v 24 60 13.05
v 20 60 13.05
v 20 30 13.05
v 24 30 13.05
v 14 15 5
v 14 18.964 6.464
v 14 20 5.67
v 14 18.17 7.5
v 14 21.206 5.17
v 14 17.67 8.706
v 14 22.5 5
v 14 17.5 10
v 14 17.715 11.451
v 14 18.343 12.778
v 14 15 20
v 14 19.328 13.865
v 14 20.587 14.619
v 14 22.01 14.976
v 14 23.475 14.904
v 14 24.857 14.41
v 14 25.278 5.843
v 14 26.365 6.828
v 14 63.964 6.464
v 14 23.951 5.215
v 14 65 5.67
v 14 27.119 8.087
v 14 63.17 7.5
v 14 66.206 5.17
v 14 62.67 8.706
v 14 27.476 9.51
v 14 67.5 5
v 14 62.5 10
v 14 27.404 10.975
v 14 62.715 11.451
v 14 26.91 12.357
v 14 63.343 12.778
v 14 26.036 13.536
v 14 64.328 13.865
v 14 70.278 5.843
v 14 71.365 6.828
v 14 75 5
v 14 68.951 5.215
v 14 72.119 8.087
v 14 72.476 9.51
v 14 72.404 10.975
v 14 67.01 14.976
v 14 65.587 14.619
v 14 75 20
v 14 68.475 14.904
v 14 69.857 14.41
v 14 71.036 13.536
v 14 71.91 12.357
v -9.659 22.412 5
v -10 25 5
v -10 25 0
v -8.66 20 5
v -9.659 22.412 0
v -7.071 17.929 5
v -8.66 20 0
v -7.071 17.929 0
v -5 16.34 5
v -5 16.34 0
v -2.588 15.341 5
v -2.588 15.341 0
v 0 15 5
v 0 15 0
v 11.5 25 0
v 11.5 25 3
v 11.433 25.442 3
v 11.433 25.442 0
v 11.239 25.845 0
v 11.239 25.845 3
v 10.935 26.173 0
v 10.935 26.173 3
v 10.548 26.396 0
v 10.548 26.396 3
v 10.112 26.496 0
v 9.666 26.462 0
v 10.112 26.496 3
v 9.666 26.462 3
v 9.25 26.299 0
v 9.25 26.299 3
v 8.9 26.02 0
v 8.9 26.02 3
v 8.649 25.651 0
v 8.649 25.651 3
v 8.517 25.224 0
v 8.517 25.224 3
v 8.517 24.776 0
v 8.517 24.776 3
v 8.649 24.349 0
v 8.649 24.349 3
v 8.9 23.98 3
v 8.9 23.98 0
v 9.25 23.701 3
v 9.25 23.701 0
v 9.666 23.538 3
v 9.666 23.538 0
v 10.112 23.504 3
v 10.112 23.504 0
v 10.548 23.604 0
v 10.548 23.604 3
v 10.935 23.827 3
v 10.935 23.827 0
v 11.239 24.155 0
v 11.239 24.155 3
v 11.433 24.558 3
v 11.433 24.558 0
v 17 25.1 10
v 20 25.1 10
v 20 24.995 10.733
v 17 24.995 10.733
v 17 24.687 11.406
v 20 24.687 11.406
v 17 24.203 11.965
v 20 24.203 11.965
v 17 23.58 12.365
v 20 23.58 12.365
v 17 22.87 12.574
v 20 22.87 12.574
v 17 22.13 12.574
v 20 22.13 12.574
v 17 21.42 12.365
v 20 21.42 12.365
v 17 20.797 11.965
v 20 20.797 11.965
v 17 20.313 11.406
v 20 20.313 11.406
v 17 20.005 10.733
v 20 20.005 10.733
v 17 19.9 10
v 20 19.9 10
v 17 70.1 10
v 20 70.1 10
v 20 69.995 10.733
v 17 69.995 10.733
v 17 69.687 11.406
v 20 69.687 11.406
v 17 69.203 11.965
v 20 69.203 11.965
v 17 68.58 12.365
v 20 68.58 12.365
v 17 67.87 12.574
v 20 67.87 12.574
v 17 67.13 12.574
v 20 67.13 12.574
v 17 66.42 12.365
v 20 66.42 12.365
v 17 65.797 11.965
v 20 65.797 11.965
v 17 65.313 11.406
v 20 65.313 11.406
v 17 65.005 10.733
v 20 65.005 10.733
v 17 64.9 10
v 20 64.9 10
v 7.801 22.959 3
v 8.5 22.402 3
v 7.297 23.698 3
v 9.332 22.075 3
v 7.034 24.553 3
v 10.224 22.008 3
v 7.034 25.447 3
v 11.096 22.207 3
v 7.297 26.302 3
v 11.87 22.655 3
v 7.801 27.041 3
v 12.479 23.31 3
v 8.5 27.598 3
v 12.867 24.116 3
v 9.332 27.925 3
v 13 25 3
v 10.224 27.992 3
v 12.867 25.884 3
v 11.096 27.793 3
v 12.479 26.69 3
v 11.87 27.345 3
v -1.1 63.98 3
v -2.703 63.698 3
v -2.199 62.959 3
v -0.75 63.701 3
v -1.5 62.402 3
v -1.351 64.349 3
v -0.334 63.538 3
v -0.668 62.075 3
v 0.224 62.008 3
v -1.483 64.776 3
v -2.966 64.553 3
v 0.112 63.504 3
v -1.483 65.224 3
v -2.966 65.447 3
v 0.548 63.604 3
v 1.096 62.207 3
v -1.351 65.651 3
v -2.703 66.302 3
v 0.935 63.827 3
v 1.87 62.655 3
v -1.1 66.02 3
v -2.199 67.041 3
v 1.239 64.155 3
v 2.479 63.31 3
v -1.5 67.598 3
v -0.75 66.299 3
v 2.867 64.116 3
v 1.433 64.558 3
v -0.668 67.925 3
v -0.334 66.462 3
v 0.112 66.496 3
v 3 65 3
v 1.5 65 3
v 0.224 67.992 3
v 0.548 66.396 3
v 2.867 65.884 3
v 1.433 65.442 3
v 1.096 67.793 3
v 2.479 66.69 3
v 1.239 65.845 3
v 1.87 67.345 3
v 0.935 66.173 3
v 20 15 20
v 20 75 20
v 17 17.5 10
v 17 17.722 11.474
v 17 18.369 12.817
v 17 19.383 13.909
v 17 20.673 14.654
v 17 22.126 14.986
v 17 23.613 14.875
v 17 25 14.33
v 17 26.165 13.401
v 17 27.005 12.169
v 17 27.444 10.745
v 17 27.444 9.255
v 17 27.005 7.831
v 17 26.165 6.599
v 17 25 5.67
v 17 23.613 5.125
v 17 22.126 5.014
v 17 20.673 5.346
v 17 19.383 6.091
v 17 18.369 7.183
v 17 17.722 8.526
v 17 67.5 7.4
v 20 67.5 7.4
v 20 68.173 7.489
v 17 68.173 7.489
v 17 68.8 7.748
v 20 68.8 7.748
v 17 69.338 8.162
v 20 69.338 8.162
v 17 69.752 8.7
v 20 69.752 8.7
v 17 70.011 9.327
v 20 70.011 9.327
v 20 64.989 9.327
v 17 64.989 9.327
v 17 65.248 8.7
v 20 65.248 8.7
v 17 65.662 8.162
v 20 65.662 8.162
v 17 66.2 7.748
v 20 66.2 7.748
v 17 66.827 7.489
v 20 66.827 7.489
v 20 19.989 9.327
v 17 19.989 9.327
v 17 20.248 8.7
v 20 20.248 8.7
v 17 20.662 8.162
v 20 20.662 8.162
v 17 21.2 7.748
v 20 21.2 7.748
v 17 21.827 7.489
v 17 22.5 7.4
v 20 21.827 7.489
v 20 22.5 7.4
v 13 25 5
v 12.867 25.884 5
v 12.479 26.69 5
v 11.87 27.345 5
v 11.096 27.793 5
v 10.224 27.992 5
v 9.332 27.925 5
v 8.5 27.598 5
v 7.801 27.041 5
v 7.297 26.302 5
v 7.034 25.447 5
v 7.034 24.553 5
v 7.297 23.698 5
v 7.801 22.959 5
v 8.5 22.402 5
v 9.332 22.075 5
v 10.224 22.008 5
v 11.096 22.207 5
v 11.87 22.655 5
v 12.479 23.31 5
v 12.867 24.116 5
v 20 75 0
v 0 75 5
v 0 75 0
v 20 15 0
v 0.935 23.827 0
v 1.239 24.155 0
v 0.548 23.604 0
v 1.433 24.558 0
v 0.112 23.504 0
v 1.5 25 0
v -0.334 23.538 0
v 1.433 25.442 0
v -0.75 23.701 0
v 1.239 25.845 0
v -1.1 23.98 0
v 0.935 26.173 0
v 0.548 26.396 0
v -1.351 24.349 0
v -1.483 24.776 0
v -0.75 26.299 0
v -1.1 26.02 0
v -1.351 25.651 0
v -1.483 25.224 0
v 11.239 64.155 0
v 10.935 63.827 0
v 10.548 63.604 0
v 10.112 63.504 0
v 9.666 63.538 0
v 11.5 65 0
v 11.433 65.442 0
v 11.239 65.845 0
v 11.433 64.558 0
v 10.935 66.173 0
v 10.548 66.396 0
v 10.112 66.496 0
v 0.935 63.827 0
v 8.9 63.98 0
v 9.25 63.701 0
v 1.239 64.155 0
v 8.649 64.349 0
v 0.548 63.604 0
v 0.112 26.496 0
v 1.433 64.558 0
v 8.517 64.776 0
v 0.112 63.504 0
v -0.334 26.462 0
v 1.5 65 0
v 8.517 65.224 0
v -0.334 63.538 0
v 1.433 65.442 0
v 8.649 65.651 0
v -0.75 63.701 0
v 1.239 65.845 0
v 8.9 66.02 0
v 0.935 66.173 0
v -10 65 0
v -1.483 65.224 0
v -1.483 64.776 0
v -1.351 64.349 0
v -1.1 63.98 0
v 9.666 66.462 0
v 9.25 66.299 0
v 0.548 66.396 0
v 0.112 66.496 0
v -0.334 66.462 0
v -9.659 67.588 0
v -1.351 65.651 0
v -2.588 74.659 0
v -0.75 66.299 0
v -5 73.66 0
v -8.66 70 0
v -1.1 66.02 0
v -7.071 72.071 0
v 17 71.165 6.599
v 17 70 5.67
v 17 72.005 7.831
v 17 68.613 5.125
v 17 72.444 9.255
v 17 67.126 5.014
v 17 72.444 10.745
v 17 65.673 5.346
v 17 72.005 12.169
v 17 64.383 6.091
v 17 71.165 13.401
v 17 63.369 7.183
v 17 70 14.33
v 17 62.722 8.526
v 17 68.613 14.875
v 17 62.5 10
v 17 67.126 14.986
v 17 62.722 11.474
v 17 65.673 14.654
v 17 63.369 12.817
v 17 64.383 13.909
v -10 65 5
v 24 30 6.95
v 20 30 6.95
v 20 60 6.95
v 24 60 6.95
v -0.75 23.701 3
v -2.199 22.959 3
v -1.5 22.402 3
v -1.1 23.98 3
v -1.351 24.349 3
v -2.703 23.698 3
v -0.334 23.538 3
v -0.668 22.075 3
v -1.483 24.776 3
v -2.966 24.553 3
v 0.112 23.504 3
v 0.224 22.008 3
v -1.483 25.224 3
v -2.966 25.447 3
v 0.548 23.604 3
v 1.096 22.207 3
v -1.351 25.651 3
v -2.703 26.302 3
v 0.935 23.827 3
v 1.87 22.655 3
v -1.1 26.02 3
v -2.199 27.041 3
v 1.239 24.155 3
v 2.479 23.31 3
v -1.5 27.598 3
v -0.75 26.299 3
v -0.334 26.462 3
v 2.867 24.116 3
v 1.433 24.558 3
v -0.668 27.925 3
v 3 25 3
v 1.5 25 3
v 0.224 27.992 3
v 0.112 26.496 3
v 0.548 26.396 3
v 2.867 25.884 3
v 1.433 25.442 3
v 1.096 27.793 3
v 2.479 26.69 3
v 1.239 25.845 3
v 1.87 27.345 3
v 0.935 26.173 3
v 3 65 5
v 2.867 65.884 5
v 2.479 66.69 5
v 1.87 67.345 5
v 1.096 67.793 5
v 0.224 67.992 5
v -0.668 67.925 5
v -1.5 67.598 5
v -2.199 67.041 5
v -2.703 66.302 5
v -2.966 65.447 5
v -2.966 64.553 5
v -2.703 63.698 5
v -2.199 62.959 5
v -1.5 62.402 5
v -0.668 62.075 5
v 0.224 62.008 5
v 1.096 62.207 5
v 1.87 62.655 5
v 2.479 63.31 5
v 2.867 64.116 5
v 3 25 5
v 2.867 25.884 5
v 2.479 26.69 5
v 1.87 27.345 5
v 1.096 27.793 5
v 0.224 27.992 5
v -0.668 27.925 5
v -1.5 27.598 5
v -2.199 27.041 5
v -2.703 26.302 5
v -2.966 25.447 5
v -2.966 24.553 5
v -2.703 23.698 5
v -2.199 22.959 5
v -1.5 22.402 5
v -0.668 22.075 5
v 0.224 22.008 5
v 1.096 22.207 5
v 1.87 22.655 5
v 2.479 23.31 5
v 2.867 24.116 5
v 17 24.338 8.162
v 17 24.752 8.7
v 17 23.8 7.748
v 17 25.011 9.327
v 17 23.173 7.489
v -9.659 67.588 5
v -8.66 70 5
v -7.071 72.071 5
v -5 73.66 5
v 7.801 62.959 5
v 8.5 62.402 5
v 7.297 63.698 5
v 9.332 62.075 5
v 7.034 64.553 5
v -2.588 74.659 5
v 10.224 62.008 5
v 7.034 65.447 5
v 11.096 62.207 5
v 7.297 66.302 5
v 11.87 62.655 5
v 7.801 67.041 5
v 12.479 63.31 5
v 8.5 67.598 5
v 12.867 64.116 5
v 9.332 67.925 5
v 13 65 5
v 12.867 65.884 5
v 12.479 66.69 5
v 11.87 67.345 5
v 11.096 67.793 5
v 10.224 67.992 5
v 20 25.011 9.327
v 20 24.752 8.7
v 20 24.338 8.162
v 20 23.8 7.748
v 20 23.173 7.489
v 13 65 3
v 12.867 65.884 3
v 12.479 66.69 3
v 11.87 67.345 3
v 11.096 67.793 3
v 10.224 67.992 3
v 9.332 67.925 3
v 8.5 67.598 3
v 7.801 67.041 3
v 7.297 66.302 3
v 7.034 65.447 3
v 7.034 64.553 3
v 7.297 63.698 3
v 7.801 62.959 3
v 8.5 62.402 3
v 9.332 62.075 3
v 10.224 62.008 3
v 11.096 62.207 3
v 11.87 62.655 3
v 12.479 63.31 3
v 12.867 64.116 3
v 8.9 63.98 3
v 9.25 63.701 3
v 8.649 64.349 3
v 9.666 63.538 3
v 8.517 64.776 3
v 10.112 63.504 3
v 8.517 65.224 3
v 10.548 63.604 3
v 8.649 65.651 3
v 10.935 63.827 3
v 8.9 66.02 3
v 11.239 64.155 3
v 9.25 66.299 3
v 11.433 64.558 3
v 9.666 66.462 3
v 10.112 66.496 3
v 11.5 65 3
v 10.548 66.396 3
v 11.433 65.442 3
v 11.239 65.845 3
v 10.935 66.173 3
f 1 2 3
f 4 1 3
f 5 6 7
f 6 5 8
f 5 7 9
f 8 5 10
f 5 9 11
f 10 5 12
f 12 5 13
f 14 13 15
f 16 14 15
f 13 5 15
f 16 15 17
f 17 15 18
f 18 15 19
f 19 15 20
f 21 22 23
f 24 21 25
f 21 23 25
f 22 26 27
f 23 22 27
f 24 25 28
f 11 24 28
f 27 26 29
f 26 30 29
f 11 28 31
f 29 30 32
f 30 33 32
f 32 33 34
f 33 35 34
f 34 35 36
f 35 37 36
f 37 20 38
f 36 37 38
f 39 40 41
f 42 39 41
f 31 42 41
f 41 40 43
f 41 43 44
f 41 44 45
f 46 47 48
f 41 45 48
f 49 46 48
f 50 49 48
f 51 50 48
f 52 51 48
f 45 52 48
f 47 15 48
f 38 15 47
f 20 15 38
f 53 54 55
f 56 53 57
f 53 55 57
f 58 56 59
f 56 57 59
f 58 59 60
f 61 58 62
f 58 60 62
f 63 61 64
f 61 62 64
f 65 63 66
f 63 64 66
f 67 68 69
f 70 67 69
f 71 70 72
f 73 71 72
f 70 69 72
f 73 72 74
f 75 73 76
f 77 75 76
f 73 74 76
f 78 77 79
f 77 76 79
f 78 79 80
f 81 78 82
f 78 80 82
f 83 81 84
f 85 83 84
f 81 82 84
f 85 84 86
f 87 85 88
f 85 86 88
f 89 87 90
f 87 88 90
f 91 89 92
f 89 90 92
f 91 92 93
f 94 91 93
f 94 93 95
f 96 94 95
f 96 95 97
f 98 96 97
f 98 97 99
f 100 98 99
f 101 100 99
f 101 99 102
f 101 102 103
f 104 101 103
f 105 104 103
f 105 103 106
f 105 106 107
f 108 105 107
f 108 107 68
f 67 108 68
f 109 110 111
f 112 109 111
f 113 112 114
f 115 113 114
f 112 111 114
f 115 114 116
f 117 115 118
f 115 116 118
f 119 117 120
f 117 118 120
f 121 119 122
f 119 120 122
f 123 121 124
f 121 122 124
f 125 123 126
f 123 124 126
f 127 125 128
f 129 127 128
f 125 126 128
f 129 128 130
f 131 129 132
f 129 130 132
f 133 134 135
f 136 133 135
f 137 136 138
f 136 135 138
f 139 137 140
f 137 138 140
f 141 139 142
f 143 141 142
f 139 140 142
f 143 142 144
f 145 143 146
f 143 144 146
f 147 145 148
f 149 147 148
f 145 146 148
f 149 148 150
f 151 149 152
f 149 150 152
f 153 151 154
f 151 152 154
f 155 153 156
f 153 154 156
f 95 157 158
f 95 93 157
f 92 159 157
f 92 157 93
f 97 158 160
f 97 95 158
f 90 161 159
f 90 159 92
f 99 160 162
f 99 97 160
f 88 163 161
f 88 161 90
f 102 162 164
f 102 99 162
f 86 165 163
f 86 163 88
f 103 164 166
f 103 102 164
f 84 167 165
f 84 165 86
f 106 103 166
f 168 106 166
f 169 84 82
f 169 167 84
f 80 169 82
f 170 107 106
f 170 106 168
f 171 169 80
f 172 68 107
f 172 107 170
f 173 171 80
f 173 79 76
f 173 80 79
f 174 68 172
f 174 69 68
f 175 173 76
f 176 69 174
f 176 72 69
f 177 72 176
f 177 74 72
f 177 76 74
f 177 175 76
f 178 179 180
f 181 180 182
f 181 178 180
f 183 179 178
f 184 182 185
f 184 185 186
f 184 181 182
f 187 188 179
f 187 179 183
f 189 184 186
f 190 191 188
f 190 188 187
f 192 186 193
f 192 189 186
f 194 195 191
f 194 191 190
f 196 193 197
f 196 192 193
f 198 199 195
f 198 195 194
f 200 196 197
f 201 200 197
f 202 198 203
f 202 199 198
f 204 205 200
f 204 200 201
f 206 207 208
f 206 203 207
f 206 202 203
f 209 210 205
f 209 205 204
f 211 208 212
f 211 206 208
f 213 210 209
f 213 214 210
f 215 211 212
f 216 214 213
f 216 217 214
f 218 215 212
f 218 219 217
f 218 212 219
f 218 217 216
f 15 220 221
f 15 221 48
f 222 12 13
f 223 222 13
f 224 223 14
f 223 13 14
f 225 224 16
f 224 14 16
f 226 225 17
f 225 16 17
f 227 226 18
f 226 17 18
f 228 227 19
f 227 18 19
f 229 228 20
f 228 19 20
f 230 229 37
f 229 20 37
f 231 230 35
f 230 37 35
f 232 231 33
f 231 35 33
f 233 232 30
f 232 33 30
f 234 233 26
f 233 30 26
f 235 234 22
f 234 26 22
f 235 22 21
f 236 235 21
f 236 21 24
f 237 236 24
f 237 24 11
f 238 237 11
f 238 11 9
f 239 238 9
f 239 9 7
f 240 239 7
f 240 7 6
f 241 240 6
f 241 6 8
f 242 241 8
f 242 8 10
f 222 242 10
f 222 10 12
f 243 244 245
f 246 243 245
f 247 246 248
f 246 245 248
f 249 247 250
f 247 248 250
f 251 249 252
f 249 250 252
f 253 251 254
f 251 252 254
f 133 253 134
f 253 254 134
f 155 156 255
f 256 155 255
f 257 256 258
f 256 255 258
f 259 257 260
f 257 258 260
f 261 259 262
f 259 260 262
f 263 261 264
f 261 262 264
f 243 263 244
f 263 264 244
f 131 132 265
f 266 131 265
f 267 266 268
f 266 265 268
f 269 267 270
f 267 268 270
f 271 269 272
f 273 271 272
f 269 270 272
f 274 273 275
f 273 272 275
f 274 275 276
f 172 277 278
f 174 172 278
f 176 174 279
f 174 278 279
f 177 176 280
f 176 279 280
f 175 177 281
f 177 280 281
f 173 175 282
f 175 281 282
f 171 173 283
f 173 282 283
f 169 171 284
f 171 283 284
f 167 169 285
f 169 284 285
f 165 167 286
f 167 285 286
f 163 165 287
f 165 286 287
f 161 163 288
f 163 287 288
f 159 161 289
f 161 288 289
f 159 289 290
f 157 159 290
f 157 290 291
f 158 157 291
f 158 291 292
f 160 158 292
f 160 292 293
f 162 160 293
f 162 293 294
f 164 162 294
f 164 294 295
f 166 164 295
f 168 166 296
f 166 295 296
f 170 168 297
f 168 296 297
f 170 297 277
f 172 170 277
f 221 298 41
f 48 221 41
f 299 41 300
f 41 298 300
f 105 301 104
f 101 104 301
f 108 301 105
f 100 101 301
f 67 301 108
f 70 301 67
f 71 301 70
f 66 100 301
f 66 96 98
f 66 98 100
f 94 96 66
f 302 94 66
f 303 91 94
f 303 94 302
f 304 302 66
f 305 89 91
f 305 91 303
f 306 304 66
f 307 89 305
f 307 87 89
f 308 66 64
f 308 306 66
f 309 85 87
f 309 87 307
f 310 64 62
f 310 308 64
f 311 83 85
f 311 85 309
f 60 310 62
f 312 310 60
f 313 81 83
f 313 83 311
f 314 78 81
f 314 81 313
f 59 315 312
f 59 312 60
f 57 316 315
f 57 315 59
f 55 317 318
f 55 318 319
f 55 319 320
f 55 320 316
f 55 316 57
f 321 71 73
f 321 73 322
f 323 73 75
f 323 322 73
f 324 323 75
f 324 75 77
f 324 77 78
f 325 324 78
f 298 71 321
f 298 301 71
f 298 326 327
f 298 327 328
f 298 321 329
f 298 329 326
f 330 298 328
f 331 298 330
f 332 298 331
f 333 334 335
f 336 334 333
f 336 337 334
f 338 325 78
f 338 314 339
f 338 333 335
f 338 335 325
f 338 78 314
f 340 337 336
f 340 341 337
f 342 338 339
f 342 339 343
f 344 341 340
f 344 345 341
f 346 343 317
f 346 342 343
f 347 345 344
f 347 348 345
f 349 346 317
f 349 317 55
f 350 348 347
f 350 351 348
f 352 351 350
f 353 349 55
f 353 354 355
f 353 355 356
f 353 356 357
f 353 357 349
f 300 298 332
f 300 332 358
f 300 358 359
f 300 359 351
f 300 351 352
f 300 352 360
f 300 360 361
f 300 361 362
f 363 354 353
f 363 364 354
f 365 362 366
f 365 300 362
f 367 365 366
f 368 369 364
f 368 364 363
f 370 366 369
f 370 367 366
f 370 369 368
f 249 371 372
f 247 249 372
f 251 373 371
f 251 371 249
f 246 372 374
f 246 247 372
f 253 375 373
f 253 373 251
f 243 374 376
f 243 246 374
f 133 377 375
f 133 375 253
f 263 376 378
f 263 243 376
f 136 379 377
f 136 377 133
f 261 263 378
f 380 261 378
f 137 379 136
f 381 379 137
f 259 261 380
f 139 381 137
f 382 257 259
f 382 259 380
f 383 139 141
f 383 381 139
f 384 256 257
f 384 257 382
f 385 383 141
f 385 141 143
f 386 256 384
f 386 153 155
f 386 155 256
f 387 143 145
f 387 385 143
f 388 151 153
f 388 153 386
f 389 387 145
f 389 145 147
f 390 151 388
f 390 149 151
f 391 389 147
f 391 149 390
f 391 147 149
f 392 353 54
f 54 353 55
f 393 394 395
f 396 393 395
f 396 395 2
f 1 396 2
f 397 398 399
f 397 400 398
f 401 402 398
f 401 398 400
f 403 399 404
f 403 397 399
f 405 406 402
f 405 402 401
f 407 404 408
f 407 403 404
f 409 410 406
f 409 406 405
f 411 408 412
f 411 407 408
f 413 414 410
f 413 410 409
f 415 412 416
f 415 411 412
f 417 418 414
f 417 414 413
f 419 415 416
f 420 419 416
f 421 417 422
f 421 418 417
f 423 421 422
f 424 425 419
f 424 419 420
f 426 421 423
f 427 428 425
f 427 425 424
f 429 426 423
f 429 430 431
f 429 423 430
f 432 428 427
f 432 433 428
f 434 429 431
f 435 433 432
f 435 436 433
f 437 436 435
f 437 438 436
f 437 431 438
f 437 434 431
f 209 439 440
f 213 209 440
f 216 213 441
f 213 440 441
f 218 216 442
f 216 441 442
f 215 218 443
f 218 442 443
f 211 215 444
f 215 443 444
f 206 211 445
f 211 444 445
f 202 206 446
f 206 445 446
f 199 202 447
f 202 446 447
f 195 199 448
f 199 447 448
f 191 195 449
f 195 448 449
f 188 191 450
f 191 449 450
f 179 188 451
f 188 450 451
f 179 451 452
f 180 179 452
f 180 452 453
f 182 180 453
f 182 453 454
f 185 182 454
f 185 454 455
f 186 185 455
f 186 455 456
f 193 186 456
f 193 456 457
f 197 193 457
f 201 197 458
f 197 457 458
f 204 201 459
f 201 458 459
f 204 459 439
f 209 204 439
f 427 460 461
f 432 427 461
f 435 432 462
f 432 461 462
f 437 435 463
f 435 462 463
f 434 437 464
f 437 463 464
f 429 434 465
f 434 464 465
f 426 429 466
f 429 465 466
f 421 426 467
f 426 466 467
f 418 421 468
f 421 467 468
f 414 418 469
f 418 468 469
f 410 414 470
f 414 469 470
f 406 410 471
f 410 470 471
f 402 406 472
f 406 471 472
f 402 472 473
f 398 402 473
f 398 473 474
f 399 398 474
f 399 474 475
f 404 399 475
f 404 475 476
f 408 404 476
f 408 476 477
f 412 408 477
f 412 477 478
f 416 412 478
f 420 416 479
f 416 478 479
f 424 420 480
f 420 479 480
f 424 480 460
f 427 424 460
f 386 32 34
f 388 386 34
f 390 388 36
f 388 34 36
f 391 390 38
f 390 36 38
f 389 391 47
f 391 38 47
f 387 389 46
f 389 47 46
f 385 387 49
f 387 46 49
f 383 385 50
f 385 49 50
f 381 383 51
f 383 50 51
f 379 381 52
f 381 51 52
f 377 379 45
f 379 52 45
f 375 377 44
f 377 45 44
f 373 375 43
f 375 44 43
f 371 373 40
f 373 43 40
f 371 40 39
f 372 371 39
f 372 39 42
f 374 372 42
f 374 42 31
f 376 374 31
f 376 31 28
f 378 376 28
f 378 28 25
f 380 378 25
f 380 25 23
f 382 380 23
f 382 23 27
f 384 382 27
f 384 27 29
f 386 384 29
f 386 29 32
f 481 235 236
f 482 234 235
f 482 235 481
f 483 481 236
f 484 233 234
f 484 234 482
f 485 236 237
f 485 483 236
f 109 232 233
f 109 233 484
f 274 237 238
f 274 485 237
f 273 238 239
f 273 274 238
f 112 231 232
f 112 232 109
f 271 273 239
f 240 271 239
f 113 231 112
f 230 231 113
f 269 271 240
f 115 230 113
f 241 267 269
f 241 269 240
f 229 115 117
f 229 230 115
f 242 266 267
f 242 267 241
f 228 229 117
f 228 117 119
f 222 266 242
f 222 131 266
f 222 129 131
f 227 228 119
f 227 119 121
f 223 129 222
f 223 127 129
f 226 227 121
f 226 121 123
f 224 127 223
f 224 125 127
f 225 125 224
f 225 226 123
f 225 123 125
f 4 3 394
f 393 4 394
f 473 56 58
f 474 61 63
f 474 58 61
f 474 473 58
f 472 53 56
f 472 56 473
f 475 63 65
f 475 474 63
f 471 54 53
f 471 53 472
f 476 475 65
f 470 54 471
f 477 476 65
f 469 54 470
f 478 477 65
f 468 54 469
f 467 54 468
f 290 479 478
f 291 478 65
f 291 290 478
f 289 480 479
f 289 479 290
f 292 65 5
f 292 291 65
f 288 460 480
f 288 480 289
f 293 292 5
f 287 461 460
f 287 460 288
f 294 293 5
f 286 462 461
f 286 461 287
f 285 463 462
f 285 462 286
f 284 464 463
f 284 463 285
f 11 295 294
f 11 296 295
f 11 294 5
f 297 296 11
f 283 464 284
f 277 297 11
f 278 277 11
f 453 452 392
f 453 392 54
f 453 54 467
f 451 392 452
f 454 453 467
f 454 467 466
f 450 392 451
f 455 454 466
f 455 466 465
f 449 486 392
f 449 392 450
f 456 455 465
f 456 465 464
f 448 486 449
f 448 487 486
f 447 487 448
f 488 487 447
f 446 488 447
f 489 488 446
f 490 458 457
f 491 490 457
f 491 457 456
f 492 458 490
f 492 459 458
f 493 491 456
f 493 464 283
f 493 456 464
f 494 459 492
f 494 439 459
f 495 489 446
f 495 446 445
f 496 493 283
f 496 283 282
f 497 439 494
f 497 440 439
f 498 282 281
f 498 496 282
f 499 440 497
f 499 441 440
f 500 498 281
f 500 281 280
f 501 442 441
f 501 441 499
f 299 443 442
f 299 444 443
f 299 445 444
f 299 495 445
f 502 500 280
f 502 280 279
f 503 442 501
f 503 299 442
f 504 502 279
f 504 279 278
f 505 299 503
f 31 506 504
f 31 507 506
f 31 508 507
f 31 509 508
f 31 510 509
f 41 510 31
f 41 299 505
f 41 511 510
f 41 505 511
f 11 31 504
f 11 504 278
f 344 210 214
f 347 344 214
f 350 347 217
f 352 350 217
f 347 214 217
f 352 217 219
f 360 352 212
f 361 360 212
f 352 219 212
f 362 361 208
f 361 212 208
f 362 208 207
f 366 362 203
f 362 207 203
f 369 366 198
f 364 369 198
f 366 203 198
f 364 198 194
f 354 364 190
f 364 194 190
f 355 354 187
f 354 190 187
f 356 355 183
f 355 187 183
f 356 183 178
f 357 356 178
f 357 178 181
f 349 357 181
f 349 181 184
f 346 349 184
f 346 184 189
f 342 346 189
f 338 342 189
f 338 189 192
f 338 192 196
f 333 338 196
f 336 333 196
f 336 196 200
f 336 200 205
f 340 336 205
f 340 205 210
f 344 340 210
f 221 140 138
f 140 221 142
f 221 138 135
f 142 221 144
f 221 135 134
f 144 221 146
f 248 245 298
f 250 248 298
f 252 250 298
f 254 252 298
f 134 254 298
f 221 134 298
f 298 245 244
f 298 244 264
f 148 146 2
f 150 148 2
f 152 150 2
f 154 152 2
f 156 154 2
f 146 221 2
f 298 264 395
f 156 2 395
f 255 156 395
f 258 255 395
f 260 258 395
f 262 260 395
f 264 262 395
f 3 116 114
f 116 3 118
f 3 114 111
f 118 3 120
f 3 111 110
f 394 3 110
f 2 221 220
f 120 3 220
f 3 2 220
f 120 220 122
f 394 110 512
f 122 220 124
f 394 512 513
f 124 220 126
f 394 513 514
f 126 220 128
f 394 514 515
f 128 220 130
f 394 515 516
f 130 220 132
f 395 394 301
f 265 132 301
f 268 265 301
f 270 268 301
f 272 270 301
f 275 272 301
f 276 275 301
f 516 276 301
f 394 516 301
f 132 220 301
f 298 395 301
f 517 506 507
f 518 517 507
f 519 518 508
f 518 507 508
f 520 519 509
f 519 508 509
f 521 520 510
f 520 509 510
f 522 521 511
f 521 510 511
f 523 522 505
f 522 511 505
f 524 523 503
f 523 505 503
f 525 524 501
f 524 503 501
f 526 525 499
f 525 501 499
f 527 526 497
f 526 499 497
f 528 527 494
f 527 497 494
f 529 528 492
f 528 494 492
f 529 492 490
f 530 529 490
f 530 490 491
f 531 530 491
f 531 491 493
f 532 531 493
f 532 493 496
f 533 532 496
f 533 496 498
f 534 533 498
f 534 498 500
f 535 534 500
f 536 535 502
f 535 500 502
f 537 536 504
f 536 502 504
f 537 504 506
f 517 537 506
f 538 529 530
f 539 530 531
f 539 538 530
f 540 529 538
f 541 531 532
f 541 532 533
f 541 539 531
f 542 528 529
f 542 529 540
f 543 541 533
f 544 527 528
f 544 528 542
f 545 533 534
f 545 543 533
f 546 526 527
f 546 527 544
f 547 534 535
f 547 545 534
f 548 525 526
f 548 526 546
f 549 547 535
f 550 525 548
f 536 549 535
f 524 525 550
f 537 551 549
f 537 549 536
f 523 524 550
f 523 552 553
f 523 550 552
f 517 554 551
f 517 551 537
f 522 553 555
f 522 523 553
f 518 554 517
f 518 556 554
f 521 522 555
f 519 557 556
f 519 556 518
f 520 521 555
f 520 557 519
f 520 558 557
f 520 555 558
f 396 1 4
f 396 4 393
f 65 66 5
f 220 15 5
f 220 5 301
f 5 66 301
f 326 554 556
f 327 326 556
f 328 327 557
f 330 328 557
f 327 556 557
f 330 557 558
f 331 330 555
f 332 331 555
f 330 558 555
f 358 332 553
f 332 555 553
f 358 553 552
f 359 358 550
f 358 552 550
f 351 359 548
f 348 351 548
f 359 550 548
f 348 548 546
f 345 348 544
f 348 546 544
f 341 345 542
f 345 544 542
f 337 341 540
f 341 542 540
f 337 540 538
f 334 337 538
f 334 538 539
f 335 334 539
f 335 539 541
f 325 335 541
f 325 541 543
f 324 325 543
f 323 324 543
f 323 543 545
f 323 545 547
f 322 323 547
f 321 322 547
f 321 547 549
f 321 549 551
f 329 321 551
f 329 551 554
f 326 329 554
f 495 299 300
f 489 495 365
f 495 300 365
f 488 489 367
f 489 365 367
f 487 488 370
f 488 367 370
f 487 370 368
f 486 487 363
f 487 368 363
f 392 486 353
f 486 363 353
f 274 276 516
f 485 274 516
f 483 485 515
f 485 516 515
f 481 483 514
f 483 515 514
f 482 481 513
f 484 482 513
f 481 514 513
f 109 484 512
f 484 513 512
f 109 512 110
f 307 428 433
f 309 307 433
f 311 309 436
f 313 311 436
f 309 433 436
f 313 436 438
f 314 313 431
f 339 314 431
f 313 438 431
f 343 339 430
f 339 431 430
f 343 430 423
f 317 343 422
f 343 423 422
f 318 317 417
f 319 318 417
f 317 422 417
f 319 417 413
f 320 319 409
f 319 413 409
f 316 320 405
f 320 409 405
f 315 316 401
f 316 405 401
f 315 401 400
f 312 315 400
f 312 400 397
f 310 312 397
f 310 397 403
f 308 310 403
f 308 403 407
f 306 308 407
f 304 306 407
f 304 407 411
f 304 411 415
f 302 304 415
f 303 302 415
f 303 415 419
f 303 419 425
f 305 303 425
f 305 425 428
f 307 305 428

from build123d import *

# Parameters (mm, degrees)
SKETCH_1_W          = 20
SKETCH_1_H          = 20
EXTRUDE_1_DEPTH     = 90
SKETCH_2_W          = 20
SKETCH_2_H          = 90
EXTRUDE_2_DEPTH     = 20
SKETCH_4_W          = 34
SKETCH_4_H          = 90
CUT_EXTRUDE_1_DEPTH = 15
CUT_EXTRUDE_2_DEPTH = 15
SKETCH_8_R          = 5
CUT_EXTRUDE_3_DEPTH = 3
SKETCH_9_R          = 1.5
CUT_EXTRUDE_4_DEPTH = 5
CUT_EXTRUDE_5_DEPTH = 40
EXTRUDE_3_DEPTH     = 4
SKETCH_12_R         = 3
CUT_EXTRUDE_6_DEPTH = 2


with BuildPart() as part:
    # 草图1 → 凸台-拉伸1 (new body)
    with BuildSketch(Plane(origin=(0, 0, 0), x_dir=(1, 0, 0), z_dir=(0, 1, 0))):
        with Locations((10, -10)):
            Rectangle(SKETCH_1_W, SKETCH_1_H)
    extrude(amount=EXTRUDE_1_DEPTH)

    # 草图2 → 凸台-拉伸2 (add)
    with BuildSketch(Plane(origin=(0, 0, 0), x_dir=(-1, 0, 0), z_dir=(0, 0, -1))):
        with Locations((10, 45)):
            Rectangle(SKETCH_2_W, SKETCH_2_H)
    extrude(amount=-EXTRUDE_2_DEPTH)

    # 草图4 → 切除-拉伸1 (cut)
    with BuildSketch(Plane.XY.offset(20)):
        with Locations((-3, 45)):
            Rectangle(SKETCH_4_W, SKETCH_4_H)
    extrude(amount=-CUT_EXTRUDE_1_DEPTH, mode=Mode.SUBTRACT)

    # 草图6 → 切除-拉伸2 (cut)
    with BuildSketch(Plane(origin=(20, 0, 0), x_dir=(0, 0, -1), z_dir=(1, 0, 0))):
        with BuildLine():
            ThreePointArc((-10, 70.1), (-12.6, 67.5), (-10, 64.9))
            Line((-10, 64.9), (-10, 70.1))
        make_face()
        with BuildLine():
            Line((-10, 70.1), (-10, 64.9))
            ThreePointArc((-10, 64.9), (-8.161522369, 65.661522369), (-7.4, 67.5))
            ThreePointArc((-7.4, 67.5), (-8.161522369, 69.338477631), (-10, 70.1))
        make_face()
        with BuildLine():
            ThreePointArc((-7.4, 22.5), (-8.161522369, 24.338477631), (-10, 25.1))
            Line((-10, 25.1), (-10, 19.9))
            ThreePointArc((-10, 19.9), (-8.161522369, 20.661522369), (-7.4, 22.5))
        make_face()
        with BuildLine():
            Line((-10, 19.9), (-10, 25.1))
            ThreePointArc((-10, 25.1), (-12.6, 22.5), (-10, 19.9))
        make_face()
    extrude(amount=-CUT_EXTRUDE_2_DEPTH, mode=Mode.SUBTRACT)

    # 草图8 → 切除-拉伸3 (cut)
    with BuildSketch(Plane.ZY.offset(-14)):
        with Locations(Location((10, 67.5, 0), (0, 0, 270))):
            Circle(SKETCH_8_R)
        with Locations(Location((10, 22.5, 0), (0, 0, 270))):
            Circle(SKETCH_8_R)
    extrude(amount=-CUT_EXTRUDE_3_DEPTH, mode=Mode.SUBTRACT)

    # 草图9 → 切除-拉伸4 (cut)
    with BuildSketch(Plane.XY.offset(5)):
        with Locations((10, 65)):
            Circle(SKETCH_9_R)
        with Locations((10, 25)):
            Circle(SKETCH_9_R)
        with Locations((0, 65)):
            Circle(SKETCH_9_R)
        with Locations((0, 25)):
            Circle(SKETCH_9_R)
    extrude(amount=-CUT_EXTRUDE_4_DEPTH, mode=Mode.SUBTRACT)

    # 草图10 → 切除-拉伸5 (cut)
    with BuildSketch(Plane(origin=(0, 0, 0), x_dir=(-1, 0, 0), z_dir=(0, 0, -1))):
        with BuildLine():
            Line((0, 15), (-20, 15))
            Line((-20, 15), (-20, 0))
            Line((-20, 0), (20, 0))
            Line((20, 0), (20, 90))
            Line((20, 90), (-20, 90))
            Line((-20, 90), (-20, 75))
            Line((-20, 75), (0, 75))
            ThreePointArc((0, 75), (7.071067812, 72.071067812), (10, 65))
            Line((10, 65), (10, 25))
            ThreePointArc((10, 25), (7.071067812, 17.928932188), (0, 15))
        make_face()
    extrude(amount=-CUT_EXTRUDE_5_DEPTH, mode=Mode.SUBTRACT)

    # 草图11 → 凸台-拉伸3 (add)
    with BuildSketch(Plane(origin=(20, 0, 0), x_dir=(0, 0, -1), z_dir=(1, 0, 0))):
        Polygon((-6.95, 60), (-10, 60), (-13.05, 60), (-13.05, 30), (-10, 30), (-6.95, 30), align=None)
    extrude(amount=EXTRUDE_3_DEPTH)

    # 草图12 → 切除-拉伸6 (cut)
    with BuildSketch(Plane.XY.offset(5)):
        with Locations((0, 65)):
            Circle(SKETCH_12_R)
        with Locations((10, 65)):
            Circle(SKETCH_12_R)
        with Locations((0, 25)):
            Circle(SKETCH_12_R)
        with Locations((10, 25)):
            Circle(SKETCH_12_R)
    extrude(amount=-CUT_EXTRUDE_6_DEPTH, mode=Mode.SUBTRACT)


solid = part.part
